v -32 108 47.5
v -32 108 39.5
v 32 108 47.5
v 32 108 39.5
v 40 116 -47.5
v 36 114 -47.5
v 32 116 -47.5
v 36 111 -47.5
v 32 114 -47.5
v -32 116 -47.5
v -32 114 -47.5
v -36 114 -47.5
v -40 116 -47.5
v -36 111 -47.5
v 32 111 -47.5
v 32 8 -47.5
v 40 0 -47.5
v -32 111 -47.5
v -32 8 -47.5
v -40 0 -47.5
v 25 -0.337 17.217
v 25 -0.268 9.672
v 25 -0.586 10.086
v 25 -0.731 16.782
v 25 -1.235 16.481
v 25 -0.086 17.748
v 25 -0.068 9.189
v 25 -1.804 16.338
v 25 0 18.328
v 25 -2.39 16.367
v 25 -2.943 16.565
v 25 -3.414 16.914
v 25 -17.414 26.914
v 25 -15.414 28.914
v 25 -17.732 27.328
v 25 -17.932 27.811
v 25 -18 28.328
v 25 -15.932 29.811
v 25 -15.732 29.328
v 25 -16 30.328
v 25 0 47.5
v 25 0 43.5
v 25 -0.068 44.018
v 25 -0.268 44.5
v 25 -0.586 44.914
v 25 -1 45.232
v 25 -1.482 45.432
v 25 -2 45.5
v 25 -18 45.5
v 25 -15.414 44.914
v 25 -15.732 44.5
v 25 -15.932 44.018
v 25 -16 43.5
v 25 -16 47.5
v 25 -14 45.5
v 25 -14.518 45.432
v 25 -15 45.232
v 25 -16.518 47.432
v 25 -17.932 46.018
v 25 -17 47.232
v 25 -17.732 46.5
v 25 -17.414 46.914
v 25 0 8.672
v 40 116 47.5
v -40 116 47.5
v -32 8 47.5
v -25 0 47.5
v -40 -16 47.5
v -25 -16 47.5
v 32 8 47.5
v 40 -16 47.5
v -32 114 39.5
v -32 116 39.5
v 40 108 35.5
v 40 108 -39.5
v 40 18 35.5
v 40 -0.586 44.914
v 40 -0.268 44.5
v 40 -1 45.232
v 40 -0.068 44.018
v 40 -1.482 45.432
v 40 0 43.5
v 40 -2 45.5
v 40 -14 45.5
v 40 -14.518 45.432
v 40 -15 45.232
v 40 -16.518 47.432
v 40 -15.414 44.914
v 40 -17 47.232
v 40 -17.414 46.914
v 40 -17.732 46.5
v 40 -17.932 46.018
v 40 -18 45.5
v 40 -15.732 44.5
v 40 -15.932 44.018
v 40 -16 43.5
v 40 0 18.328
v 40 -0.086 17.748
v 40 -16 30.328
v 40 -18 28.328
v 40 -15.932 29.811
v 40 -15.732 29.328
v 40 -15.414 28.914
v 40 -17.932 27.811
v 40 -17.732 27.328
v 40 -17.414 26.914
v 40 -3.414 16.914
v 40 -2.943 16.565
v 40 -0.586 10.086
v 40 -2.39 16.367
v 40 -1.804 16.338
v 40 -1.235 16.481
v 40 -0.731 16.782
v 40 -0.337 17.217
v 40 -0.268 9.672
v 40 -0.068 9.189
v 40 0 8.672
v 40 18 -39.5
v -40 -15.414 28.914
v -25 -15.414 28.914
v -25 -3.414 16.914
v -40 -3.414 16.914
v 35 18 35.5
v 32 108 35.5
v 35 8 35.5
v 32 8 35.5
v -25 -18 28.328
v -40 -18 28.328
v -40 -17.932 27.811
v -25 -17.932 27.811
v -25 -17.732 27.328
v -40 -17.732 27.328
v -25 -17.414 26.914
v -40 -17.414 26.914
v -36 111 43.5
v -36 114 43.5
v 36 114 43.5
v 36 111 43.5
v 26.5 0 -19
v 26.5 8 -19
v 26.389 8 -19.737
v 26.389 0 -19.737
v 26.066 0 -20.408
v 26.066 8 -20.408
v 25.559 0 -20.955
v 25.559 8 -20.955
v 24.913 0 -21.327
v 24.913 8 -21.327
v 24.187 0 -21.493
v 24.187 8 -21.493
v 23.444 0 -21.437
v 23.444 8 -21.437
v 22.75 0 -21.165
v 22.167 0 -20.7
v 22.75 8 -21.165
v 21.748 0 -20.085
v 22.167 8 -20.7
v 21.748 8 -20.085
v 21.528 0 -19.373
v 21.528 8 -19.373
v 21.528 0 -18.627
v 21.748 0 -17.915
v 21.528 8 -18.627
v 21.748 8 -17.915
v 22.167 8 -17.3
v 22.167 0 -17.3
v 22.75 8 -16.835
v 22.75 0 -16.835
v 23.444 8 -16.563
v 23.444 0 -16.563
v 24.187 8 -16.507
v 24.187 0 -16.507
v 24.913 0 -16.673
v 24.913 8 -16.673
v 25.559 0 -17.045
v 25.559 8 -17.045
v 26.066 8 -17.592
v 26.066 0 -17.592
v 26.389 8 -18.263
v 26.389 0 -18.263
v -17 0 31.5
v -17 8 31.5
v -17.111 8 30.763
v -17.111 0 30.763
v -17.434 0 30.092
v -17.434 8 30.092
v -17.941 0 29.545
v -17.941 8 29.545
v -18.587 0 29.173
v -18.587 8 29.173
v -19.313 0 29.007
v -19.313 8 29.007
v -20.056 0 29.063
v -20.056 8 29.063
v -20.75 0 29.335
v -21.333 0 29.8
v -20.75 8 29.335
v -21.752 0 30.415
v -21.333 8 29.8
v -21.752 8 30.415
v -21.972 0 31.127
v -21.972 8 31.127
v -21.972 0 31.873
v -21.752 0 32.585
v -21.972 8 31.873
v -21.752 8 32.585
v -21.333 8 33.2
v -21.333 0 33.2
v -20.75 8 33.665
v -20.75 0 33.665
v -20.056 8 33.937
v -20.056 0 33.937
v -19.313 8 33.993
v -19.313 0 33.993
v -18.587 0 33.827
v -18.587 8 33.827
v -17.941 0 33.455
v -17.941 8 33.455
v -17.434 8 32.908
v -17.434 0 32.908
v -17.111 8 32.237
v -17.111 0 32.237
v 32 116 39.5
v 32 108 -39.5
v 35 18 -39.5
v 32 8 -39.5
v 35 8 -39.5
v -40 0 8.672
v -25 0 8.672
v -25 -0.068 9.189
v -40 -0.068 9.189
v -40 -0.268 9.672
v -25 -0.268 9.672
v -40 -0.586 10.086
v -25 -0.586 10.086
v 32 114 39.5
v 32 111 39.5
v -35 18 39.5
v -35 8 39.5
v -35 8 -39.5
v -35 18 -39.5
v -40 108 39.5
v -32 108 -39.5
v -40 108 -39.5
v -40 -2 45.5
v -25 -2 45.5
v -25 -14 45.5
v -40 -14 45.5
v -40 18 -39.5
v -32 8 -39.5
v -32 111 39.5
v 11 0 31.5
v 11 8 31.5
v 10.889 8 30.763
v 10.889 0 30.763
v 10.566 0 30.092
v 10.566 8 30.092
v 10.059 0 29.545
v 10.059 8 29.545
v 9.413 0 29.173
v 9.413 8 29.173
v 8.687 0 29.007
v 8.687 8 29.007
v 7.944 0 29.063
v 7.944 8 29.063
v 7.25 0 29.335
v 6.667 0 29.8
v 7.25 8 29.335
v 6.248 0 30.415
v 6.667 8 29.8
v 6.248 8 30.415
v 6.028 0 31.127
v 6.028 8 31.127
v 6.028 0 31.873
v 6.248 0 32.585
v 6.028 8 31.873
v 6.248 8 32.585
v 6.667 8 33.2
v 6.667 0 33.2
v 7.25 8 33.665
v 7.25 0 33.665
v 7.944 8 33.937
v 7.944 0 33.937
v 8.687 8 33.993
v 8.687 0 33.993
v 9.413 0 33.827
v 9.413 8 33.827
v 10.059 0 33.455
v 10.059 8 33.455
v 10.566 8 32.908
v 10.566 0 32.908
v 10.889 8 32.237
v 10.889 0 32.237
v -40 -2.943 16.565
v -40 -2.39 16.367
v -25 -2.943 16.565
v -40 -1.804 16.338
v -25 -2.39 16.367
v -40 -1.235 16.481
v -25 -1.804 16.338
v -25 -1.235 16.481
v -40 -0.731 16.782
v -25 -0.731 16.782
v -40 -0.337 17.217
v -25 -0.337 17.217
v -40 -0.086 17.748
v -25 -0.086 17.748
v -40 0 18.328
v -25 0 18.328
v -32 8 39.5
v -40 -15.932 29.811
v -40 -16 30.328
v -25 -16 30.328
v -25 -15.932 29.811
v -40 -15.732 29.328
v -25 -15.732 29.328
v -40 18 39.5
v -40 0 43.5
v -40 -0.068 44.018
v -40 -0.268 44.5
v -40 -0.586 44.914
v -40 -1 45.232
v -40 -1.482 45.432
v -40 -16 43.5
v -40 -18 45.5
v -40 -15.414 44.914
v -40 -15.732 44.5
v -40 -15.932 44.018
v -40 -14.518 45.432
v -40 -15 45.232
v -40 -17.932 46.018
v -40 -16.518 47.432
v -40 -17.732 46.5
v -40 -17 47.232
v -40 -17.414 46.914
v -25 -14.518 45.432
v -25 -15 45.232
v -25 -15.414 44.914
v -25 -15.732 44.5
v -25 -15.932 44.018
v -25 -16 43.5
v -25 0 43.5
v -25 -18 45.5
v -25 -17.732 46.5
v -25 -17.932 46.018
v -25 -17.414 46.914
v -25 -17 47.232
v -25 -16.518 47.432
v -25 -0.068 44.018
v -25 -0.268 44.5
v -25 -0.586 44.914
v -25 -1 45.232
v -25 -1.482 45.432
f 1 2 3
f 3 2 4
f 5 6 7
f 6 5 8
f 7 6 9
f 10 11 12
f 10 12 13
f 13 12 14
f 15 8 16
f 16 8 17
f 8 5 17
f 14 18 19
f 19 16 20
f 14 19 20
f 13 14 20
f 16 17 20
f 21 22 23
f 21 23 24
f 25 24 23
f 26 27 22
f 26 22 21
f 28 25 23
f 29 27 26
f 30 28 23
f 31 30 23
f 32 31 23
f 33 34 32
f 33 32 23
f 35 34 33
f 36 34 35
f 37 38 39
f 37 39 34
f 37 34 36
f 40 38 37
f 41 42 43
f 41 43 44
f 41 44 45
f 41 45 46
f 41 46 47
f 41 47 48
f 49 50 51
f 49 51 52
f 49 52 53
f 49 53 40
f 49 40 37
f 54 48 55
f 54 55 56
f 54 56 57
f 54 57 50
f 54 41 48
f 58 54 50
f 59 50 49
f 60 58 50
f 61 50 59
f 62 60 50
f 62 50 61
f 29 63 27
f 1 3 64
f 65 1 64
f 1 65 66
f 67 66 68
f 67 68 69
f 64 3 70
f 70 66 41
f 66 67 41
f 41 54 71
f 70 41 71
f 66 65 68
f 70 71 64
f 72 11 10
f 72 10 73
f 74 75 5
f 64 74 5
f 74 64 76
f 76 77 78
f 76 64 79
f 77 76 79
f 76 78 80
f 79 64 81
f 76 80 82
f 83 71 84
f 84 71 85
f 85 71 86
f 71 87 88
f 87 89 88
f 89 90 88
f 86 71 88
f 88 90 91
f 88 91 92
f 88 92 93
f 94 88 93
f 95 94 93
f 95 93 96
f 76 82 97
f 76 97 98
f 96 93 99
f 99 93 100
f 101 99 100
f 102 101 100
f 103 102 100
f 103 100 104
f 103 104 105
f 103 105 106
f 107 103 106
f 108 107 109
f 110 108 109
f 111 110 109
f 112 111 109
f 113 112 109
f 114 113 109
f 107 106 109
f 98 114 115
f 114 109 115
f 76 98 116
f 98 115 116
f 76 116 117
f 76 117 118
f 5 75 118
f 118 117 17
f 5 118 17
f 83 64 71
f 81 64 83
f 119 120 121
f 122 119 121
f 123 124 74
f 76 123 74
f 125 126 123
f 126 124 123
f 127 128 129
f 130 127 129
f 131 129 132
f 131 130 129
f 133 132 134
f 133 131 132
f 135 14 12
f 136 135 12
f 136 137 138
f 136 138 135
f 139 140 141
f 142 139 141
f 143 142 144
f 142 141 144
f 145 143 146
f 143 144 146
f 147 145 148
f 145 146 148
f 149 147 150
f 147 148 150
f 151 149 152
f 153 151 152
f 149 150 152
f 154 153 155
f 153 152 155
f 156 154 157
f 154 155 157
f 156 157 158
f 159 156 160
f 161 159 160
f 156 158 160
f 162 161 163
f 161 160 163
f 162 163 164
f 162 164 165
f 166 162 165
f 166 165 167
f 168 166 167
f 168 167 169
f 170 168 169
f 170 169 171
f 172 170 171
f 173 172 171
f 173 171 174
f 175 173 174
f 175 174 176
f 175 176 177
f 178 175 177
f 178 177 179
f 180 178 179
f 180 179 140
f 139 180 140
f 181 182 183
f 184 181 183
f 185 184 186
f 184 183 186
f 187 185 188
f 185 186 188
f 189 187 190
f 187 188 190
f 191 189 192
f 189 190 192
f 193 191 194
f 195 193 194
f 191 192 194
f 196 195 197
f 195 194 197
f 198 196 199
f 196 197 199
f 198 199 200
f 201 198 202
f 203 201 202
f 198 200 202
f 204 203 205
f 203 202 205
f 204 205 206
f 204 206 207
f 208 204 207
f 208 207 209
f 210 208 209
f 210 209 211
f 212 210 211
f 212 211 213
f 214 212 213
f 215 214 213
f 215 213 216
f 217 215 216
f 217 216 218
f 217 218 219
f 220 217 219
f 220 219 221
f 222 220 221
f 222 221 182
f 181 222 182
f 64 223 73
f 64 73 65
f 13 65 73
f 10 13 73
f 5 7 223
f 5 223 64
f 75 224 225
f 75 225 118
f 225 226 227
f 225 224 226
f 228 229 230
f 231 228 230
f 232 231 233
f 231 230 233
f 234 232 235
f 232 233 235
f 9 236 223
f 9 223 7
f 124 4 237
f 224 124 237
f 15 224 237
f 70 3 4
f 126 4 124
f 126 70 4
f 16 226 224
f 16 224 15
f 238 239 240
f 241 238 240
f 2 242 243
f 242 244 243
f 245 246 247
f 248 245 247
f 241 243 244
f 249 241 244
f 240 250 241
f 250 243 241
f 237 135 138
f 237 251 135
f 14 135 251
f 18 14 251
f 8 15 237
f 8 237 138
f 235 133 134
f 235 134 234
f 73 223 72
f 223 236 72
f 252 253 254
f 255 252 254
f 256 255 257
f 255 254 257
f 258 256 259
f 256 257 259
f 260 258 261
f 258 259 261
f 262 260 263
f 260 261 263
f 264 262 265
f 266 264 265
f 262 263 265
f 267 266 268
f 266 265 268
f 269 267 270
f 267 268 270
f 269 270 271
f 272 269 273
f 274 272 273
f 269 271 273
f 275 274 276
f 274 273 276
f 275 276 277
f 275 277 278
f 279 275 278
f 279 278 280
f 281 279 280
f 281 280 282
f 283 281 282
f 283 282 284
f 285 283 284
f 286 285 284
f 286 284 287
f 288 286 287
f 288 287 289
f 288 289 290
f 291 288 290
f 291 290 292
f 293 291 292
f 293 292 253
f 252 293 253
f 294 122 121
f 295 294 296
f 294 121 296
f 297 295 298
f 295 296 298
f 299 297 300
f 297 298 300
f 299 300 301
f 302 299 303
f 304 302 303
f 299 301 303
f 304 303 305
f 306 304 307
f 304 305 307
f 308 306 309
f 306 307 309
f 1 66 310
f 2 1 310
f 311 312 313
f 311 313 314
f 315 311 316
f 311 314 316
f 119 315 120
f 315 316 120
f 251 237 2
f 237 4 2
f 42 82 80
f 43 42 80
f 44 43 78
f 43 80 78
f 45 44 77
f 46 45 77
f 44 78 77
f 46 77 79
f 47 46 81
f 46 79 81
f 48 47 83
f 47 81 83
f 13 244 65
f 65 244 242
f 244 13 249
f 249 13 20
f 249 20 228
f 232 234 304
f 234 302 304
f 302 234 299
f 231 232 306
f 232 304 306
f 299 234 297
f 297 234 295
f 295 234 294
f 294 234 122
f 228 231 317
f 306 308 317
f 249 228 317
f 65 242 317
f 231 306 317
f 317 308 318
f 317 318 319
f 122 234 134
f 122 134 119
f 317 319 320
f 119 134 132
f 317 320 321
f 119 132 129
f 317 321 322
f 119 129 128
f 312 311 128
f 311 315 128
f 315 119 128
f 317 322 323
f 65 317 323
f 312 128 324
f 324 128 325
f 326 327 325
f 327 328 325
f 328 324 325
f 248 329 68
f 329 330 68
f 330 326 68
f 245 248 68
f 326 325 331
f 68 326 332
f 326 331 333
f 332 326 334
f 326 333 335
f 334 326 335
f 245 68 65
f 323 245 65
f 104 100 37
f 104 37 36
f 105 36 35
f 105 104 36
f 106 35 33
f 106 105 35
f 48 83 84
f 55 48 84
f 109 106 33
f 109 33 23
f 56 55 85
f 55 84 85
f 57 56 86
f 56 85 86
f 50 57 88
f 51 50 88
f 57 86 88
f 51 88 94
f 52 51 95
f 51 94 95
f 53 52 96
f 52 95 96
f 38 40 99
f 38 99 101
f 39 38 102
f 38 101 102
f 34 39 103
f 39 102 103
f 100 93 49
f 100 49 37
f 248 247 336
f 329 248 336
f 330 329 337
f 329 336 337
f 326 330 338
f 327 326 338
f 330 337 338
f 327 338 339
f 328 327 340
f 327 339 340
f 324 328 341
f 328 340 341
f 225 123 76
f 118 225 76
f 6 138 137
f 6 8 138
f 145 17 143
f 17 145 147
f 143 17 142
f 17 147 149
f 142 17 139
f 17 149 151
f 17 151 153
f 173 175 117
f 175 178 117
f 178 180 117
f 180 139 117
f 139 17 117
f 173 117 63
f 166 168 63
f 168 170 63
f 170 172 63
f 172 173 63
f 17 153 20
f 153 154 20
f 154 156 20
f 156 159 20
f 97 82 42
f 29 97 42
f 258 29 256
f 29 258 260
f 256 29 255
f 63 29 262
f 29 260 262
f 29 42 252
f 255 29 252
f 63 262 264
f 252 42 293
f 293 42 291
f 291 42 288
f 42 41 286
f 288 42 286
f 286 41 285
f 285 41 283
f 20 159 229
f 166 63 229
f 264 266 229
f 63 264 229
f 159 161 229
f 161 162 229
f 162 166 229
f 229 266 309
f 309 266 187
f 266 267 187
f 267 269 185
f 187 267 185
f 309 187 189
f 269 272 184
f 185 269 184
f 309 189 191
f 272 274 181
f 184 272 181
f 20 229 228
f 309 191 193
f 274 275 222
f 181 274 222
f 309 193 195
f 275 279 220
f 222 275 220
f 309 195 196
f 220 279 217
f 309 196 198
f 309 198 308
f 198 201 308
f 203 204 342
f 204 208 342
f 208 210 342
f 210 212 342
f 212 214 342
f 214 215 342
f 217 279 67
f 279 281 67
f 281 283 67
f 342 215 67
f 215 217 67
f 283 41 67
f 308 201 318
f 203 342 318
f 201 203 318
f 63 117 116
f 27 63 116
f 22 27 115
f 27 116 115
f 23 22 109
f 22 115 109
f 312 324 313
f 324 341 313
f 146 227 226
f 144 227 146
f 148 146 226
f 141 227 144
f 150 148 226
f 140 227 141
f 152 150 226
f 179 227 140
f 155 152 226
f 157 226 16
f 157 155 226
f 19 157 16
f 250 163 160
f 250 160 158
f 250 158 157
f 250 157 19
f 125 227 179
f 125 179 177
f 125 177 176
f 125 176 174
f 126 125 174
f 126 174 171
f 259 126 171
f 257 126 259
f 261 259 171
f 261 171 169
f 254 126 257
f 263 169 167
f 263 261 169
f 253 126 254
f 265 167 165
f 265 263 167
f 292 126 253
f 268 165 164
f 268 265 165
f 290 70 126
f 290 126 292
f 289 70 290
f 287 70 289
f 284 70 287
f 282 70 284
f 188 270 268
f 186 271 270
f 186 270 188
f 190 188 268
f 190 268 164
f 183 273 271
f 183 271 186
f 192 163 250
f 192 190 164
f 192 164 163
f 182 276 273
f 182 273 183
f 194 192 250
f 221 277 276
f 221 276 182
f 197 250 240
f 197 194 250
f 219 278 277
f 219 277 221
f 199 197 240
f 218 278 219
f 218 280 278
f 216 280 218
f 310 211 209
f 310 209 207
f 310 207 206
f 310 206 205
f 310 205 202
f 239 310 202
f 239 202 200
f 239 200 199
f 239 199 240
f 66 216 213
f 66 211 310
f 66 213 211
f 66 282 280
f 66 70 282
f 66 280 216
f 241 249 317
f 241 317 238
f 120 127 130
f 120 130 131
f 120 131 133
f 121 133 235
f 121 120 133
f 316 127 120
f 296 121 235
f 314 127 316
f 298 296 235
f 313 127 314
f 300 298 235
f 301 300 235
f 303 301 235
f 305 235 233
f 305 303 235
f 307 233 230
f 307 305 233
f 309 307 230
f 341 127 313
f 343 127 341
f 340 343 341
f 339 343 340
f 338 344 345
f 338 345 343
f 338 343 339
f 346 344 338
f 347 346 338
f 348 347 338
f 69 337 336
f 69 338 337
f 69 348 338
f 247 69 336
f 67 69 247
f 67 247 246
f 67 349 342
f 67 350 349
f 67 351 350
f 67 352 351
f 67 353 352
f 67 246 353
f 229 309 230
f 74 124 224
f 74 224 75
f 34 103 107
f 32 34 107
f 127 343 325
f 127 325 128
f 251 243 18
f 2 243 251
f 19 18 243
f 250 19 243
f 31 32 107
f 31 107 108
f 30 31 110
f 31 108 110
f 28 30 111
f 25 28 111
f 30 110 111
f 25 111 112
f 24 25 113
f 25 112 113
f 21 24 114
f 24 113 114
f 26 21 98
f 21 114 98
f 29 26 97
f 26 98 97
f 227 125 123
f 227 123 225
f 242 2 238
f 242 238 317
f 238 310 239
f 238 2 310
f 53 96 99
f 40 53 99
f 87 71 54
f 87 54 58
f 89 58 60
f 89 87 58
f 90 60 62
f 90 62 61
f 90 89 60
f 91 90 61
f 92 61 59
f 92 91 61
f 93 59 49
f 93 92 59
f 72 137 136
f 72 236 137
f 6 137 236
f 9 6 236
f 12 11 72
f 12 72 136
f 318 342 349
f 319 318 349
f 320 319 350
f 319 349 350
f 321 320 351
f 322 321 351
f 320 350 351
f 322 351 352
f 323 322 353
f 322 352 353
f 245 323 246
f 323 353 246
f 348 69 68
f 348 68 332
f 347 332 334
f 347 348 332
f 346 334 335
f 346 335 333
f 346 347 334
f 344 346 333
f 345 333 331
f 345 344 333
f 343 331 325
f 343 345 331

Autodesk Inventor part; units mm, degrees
ref_plane "YZ Plane" through (0, 0, 0) normal (1, 0, 0) x (0, 1, 0)
ref_plane "XZ Plane" through (0, 0, 0) normal (0, 1, 0) x (-1, 0, 0)
ref_plane "XY Plane" through (0, 0, 0) normal (0, 0, 1) x (1, 0, 0)
sketch "Sketch1" plane through (0, 0, 0) normal (0, 1, 0) x (-1, 0, 0)
  line L0 (-40, -47.5) -> (40, -47.5)
  line L1 (40, -47.5) -> (40, 47.5)
  line L2 (40, 47.5) -> (-40, 47.5)
  line L3 (-40, 47.5) -> (-40, -47.5)
  line L4 (-40, -47.5) -> (40, 47.5) construction
  line L5 (40, -47.5) -> (-40, 47.5) construction
  point P0 (0, 0)
  dimension "d0" = 80
  dimension "d1" = 95
extrude "Extrusion1" add sketch "Sketch1" along normal blind 8
sketch "Sketch2" plane through (40, 0, 47.5) normal (1, 0, 0) x (0, 0, -1)
  line L0 (0, 0) -> (95, 0) projected
  line L1 (95, 0) -> (95, 8) projected
  line L2 (0, 8) -> (95, 8) projected
  line L3 (0, 0) -> (0, 8) projected
  line L4 (95, 0) -> (0, 0) projected
  line L5 (0, 0) -> (0, -16)
  line L6 (2, -18) -> (19.1716, -18)
  line L7 (2, -2) -> (2, -14)
  line L8 (4, -16) -> (17.1716, -16)
  line L9 (20.5858, -17.4142) -> (37.4142, -0.5858)
  line L10 (18.5858, -15.4142) -> (30.5858, -3.4142)
  arc A0 (2, -14) -> (4, -16) centre (4, -14) ccw
  arc A1 (0, -16) -> (2, -18) centre (2, -16) ccw
  arc A2 (19.1716, -18) -> (20.5858, -17.4142) centre (19.1716, -16) ccw
  arc A3 (17.1716, -16) -> (18.5858, -15.4142) centre (17.1716, -14) ccw
  line L11 (4, 0) -> (29.1716, 0)
  arc A4 (30.5858, -3.4142) -> (29.1716, 0) centre (29.1716, -2) ccw
  line L12 (38.8284, 0) -> (47.5, 0)
  arc A5 (38.8284, 0) -> (37.4142, -0.5858) centre (38.8284, -2) ccw
  arc A6 (4, 0) -> (2, -2) centre (4, -2) ccw
  point P0 (0, -18)
  point P1 (20, -18)
  point P2 (22, -16)
  point P3 (38, 0)
  point P4 (34, 0)
  point P5 (34, 0)
  dimension "d4" = 18
  dimension "d5" = 20
  dimension "d6" = 2
  dimension "d7" = 45
  dimension "d8" = 2
  dimension "d9" = 2
  dimension "d10" = 2
extrude "Extrusion2" add sketch "Sketch2" against normal up to surface (80 mm away) contours L0 A6 L7 A0 L8 A3 L10 A4 A5 L9 A2 L6 A1 L5
sketch "Sketch3" plane through (-40, 8, 47.5) normal (0, 0, 1) x (1, 0, 0)
  line L0 (80, 0) -> (0, 0) projected
  line L1 (0, 0) -> (15, 0)
  line L2 (80, 0) -> (65, 0)
  line L3 (80, -26) -> (0, -26) projected
  line L4 (15, 0) -> (65, 0)
  line L5 (65, 0) -> (65, -26)
  line L6 (65, -26) -> (15, -26)
  line L7 (15, -26) -> (15, 0)
  line L8 (15, 0) -> (65, 0)
  line L9 (65, 0) -> (65, -8)
  line L10 (65, -8) -> (15, -8)
  line L11 (15, -8) -> (15, 0)
  line L12 (80, -24) -> (80, 0) projected
  point P0 (40, -8)
  dimension "d13" = 15
  dimension "d15" = 50
  dimension "d16" = 8
  dimension "d41" = 15
extrude "Extrusion3" cut sketch "Sketch3" against normal blind 39 contours L5 L3 L7 L10
sketch "Sketch4" plane through (0, 8, 0) normal (0, 1, 0) x (1, 0, 0)
  line L0 (40, 47.5) -> (-40, 47.5) projected
  line L1 (-40, 47.5) -> (-40, -47.5) projected
  line L2 (-40, -47.5) -> (40, -47.5) projected
  line L3 (40, -47.5) -> (40, 47.5) projected
  line L4 (40, 47.5) -> (-40, 47.5) projected
  line L5 (-40, -47.5) -> (-35, -47.5)
  line L6 (-35, -47.5) -> (-35, 47.5)
  line L7 (-35, 47.5) -> (-40, 47.5)
  line L8 (-40, 47.5) -> (-40, -47.5)
  line L9 (40, -47.5) -> (35, -47.5)
  line L10 (35, -47.5) -> (35, 47.5)
  line L11 (35, 47.5) -> (40, 47.5)
  line L12 (40, 47.5) -> (40, -47.5)
  line L13 (40, -47.5) -> (32, -47.5)
  line L14 (32, -47.5) -> (32, -39.5)
  line L15 (32, -39.5) -> (40, -39.5)
  line L16 (40, -39.5) -> (40, -47.5)
  line L17 (-40, -47.5) -> (-32, -47.5)
  line L18 (-32, -47.5) -> (-32, -39.5)
  line L19 (-32, -39.5) -> (-40, -39.5)
  line L20 (-40, -39.5) -> (-40, -47.5)
  line L21 (-40, 47.5) -> (-40, -47.5) projected
  line L22 (-40, 47.5) -> (-32, 47.5)
  line L23 (-32, 47.5) -> (-32, 39.5)
  line L24 (-32, 39.5) -> (-40, 39.5)
  line L25 (-40, 39.5) -> (-40, 47.5)
  line L26 (40, 47.5) -> (32, 47.5)
  line L27 (32, 47.5) -> (32, 39.5)
  line L28 (32, 39.5) -> (40, 39.5)
  line L29 (40, 39.5) -> (40, 47.5)
  point P0 (0, 0)
  dimension "d19" = 5
  dimension "d20" = 5
  dimension "d21" = 8
  dimension "d22" = 8
  dimension "d23" = 8
  dimension "d24" = 8
  dimension "d25" = 8
  dimension "d26" = 8
  dimension "d27" = 8
  dimension "d28" = 8
extrude "Extrusion4" add sketch "Sketch4" along normal blind 10 contours L3 L28 L10 L0 | L3 L15 L10 L28 | L3 L2 L10 L15 | L6 L24 L1 L0 | L6 L19 L1 L24 | L6 L2 L1 L19
sketch "Sketch6" plane through (0, 8, 0) normal (0, 1, 0) x (1, 0, 0)
  line L0 (40, 47.5) -> (-40, 47.5) projected
  line L1 (-40, 47.5) -> (-32, 47.5)
  line L2 (-32, 47.5) -> (-32, 39.5)
  line L3 (-32, 39.5) -> (-40, 39.5)
  line L4 (-40, 39.5) -> (-40, 47.5)
  line L5 (40, 47.5) -> (32, 47.5)
  line L6 (32, 47.5) -> (32, 39.5)
  line L7 (32, 39.5) -> (40, 39.5)
  line L8 (40, 39.5) -> (40, 47.5)
  line L9 (-25, -47.5) -> (-40, -47.5) projected
  line L10 (-40, -47.5) -> (-32, -47.5)
  line L11 (-32, -47.5) -> (-32, -39.5)
  line L12 (-32, -39.5) -> (-40, -39.5)
  line L13 (-40, -39.5) -> (-40, -47.5)
  line L14 (40, -43.5) -> (40, -18.3284) projected
  line L15 (-35, -47.5) -> (35, -47.5) projected
  line L16 (40, -40.5) -> (48.82, -40.5) construction
  line L17 (40, -47.5) -> (32, -47.5)
  line L18 (32, -47.5) -> (32, -35.5)
  line L19 (32, -35.5) -> (40, -35.5)
  line L20 (40, -35.5) -> (40, -47.5)
  line L21 (35, -47.5) -> (35, 47.5) projected
  line L22 (35, -47.5) -> (40, -38.8397)
  line L23 (40, -30.3284) -> (40, -43.5) projected
  line L24 (35, -47.5) -> (45, -47.5) construction
  point P0 (0, 0)
  dimension "d42" = 8
  dimension "d43" = 8
  dimension "d44" = 8
  dimension "d45" = 8
  dimension "d46" = 8
  dimension "d47" = 8
  dimension "d81" = 8
  dimension "d82" = 12
  dimension "d83" = 60
extrude "Extrusion5" add sketch "Sketch6" along normal blind 100
sketch "Sketch7" plane through (0, 108, 0) normal (0, 1, 0) x (1, 0, 0)
  line L0 (-40, -47.5) -> (-40, -45.5) projected
  line L1 (-32, 47.5) -> (-40, 47.5) projected
  line L2 (-40, -47.5) -> (-32, -47.5)
  line L3 (-32, -47.5) -> (-32, 47.5)
  line L4 (-32, 47.5) -> (-40, 47.5)
  line L5 (-40, 47.5) -> (-40, -47.5)
  line L6 (35, -39.5) -> (40, -39.5) projected
  line L7 (-40, -47.5) -> (40, -47.5)
  line L8 (40, -47.5) -> (40, -39.5)
  line L9 (40, -39.5) -> (-40, -39.5)
  line L10 (-40, -39.5) -> (-40, -47.5)
  line L11 (32, 39.5) -> (32, 47.5) projected
  line L12 (32, 47.5) -> (40, 47.5)
  line L13 (40, 47.5) -> (40, -47.5)
  line L14 (40, -47.5) -> (32, -47.5)
  line L15 (32, -47.5) -> (32, 47.5)
  point P0 (0, 0)
extrude "Extrusion6" add sketch "Sketch7" along normal blind 8
sketch "Sketch8" plane through (40, 0, -47.5) normal (0, 0, -1) x (-1, 0, 0)
  line L0 (8, 8) -> (72, 8) projected
  line L1 (8, 8) -> (8, 116) projected
  line L2 (0, 116) -> (8, 116) projected
  line L3 (0, 0) -> (0, 116) projected
  line L4 (0, 0) -> (80, 0) projected
  line L5 (80, 0) -> (80, 116) projected
  line L6 (72, 116) -> (80, 116) projected
  line L7 (72, 8) -> (72, 116) projected
  line L8 (0, 116) -> (8, 116) projected
  line L9 (8, 8) -> (8, 108) projected
  line L10 (0, 116) -> (8, 116)
  line L11 (8, 108) -> (0, 108)
  line L12 (0, 108) -> (0, 116)
  line L13 (0, 108) -> (8, 108) projected
  line L14 (8, 108) -> (8, 111)
  line L15 (8, 8) -> (8, 116) projected
  line L16 (8, 111) -> (4, 111)
  line L17 (4, 111) -> (4, 114)
  line L18 (4, 114) -> (8, 114)
  line L19 (80, 116) -> (0, 116) projected
  line L20 (40, 116) -> (40, 8)
  line L21 (72, 8) -> (8, 8) projected
  line L22 (80, 116) -> (72, 116)
  line L23 (80, 116) -> (72, 116)
  line L24 (80, 116) -> (72, 116)
  line L25 (72, 108) -> (80, 108)
  line L26 (80, 108) -> (80, 116)
  line L27 (80, 108) -> (72, 108)
  line L28 (72, 108) -> (72, 111)
  line L29 (72, 111) -> (76, 111)
  line L30 (76, 111) -> (76, 114)
  line L31 (76, 114) -> (72, 114)
  line L32 (8, 114) -> (72, 114)
  line L33 (72, 111) -> (8, 111)
  line L34 (72, 114) -> (76, 114)
  line L35 (76, 114) -> (76, 111)
  line L36 (76, 111) -> (72, 111)
  line L37 (72, 116) -> (72, 114)
  line L38 (72, 111) -> (72, 108)
  line L39 (8, 116) -> (8, 114)
  line L40 (8, 111) -> (8, 108)
  line L41 (4, 114) -> (8, 114)
  line L42 (4, 111) -> (8, 111)
  line L43 (4, 114) -> (76, 114)
  line L44 (76, 114) -> (76, 111)
  line L45 (76, 111) -> (4, 111)
  line L46 (4, 111) -> (4, 114)
  point P0 (40, 0)
  dimension "d52" = 3
  dimension "d53" = 4
  dimension "d54" = 3
extrude "Extrusion7" cut sketch "Sketch8" against normal blind 91 contours L33 L1 L32 L20 | L20 L32 L7 L33 | L16 L17 L18 L1 | L7 L31 L30 L29
sketch "Sketch9" plane through (0, 8, 0) normal (0, 1, 0) x (1, 0, 0)
  line L0 (0, -31.5) -> (8.5, -31.5)
  circle A0 centre (8.5, -31.5) radius 2.5
  circle A1 centre (-19.5, -31.5) radius 2.5
  circle A2 centre (-19.5, -31.5) radius 2.5
  line L1 (0, -31.5) -> (-19.5, -31.5)
  line L2 (0, 0) -> (0, -31.5)
  line L3 (0, 0) -> (0, 17.5)
  line L4 (0, 17.5) -> (0, 19)
  line L5 (0, 19) -> (24, 19)
  circle A3 centre (24, 19) radius 2.5
  line L6 (0, 0) -> (2.25, 0)
  line L7 (-27.5, 38.25) -> (28.5, 38.25)
  line L8 (28.5, 38.25) -> (28.5, -36.75)
  line L9 (28.5, -36.75) -> (-27.5, -36.75)
  line L10 (-27.5, -36.75) -> (-27.5, 38.25)
  line L11 (-27.5, 38.25) -> (28.5, -36.75) construction
  line L12 (28.5, 38.25) -> (-27.5, -36.75) construction
  line L13 (-19.5, -31.5) -> (-19.5, -36.75)
  line L14 (25.5, 17) -> (28.5, 17)
  line L15 (28.5, 17) -> (28.5, -36.75)
  point P0 (0.5, 0.75)
  dimension "d63" = 5
  dimension "d61" = 5
  dimension "d62" = 5
  dimension "d64" = 17.5
  dimension "d65" = 8.5
  dimension "d66" = 19.5
  dimension "d67" = 31.5
  dimension "d68" = 24
  dimension "d69" = 43.5
  dimension "d70" = 2.25
  dimension "d71" = 56
  dimension "d72" = 75
  dimension "d73" = 5.25
  dimension "d74" = 3
extrude "Extrusion8" cut sketch "Sketch9" against normal blind 10 contours A0 | L1 L13 A1 | A1 L13 L1 | A3
properties part number "Base"
